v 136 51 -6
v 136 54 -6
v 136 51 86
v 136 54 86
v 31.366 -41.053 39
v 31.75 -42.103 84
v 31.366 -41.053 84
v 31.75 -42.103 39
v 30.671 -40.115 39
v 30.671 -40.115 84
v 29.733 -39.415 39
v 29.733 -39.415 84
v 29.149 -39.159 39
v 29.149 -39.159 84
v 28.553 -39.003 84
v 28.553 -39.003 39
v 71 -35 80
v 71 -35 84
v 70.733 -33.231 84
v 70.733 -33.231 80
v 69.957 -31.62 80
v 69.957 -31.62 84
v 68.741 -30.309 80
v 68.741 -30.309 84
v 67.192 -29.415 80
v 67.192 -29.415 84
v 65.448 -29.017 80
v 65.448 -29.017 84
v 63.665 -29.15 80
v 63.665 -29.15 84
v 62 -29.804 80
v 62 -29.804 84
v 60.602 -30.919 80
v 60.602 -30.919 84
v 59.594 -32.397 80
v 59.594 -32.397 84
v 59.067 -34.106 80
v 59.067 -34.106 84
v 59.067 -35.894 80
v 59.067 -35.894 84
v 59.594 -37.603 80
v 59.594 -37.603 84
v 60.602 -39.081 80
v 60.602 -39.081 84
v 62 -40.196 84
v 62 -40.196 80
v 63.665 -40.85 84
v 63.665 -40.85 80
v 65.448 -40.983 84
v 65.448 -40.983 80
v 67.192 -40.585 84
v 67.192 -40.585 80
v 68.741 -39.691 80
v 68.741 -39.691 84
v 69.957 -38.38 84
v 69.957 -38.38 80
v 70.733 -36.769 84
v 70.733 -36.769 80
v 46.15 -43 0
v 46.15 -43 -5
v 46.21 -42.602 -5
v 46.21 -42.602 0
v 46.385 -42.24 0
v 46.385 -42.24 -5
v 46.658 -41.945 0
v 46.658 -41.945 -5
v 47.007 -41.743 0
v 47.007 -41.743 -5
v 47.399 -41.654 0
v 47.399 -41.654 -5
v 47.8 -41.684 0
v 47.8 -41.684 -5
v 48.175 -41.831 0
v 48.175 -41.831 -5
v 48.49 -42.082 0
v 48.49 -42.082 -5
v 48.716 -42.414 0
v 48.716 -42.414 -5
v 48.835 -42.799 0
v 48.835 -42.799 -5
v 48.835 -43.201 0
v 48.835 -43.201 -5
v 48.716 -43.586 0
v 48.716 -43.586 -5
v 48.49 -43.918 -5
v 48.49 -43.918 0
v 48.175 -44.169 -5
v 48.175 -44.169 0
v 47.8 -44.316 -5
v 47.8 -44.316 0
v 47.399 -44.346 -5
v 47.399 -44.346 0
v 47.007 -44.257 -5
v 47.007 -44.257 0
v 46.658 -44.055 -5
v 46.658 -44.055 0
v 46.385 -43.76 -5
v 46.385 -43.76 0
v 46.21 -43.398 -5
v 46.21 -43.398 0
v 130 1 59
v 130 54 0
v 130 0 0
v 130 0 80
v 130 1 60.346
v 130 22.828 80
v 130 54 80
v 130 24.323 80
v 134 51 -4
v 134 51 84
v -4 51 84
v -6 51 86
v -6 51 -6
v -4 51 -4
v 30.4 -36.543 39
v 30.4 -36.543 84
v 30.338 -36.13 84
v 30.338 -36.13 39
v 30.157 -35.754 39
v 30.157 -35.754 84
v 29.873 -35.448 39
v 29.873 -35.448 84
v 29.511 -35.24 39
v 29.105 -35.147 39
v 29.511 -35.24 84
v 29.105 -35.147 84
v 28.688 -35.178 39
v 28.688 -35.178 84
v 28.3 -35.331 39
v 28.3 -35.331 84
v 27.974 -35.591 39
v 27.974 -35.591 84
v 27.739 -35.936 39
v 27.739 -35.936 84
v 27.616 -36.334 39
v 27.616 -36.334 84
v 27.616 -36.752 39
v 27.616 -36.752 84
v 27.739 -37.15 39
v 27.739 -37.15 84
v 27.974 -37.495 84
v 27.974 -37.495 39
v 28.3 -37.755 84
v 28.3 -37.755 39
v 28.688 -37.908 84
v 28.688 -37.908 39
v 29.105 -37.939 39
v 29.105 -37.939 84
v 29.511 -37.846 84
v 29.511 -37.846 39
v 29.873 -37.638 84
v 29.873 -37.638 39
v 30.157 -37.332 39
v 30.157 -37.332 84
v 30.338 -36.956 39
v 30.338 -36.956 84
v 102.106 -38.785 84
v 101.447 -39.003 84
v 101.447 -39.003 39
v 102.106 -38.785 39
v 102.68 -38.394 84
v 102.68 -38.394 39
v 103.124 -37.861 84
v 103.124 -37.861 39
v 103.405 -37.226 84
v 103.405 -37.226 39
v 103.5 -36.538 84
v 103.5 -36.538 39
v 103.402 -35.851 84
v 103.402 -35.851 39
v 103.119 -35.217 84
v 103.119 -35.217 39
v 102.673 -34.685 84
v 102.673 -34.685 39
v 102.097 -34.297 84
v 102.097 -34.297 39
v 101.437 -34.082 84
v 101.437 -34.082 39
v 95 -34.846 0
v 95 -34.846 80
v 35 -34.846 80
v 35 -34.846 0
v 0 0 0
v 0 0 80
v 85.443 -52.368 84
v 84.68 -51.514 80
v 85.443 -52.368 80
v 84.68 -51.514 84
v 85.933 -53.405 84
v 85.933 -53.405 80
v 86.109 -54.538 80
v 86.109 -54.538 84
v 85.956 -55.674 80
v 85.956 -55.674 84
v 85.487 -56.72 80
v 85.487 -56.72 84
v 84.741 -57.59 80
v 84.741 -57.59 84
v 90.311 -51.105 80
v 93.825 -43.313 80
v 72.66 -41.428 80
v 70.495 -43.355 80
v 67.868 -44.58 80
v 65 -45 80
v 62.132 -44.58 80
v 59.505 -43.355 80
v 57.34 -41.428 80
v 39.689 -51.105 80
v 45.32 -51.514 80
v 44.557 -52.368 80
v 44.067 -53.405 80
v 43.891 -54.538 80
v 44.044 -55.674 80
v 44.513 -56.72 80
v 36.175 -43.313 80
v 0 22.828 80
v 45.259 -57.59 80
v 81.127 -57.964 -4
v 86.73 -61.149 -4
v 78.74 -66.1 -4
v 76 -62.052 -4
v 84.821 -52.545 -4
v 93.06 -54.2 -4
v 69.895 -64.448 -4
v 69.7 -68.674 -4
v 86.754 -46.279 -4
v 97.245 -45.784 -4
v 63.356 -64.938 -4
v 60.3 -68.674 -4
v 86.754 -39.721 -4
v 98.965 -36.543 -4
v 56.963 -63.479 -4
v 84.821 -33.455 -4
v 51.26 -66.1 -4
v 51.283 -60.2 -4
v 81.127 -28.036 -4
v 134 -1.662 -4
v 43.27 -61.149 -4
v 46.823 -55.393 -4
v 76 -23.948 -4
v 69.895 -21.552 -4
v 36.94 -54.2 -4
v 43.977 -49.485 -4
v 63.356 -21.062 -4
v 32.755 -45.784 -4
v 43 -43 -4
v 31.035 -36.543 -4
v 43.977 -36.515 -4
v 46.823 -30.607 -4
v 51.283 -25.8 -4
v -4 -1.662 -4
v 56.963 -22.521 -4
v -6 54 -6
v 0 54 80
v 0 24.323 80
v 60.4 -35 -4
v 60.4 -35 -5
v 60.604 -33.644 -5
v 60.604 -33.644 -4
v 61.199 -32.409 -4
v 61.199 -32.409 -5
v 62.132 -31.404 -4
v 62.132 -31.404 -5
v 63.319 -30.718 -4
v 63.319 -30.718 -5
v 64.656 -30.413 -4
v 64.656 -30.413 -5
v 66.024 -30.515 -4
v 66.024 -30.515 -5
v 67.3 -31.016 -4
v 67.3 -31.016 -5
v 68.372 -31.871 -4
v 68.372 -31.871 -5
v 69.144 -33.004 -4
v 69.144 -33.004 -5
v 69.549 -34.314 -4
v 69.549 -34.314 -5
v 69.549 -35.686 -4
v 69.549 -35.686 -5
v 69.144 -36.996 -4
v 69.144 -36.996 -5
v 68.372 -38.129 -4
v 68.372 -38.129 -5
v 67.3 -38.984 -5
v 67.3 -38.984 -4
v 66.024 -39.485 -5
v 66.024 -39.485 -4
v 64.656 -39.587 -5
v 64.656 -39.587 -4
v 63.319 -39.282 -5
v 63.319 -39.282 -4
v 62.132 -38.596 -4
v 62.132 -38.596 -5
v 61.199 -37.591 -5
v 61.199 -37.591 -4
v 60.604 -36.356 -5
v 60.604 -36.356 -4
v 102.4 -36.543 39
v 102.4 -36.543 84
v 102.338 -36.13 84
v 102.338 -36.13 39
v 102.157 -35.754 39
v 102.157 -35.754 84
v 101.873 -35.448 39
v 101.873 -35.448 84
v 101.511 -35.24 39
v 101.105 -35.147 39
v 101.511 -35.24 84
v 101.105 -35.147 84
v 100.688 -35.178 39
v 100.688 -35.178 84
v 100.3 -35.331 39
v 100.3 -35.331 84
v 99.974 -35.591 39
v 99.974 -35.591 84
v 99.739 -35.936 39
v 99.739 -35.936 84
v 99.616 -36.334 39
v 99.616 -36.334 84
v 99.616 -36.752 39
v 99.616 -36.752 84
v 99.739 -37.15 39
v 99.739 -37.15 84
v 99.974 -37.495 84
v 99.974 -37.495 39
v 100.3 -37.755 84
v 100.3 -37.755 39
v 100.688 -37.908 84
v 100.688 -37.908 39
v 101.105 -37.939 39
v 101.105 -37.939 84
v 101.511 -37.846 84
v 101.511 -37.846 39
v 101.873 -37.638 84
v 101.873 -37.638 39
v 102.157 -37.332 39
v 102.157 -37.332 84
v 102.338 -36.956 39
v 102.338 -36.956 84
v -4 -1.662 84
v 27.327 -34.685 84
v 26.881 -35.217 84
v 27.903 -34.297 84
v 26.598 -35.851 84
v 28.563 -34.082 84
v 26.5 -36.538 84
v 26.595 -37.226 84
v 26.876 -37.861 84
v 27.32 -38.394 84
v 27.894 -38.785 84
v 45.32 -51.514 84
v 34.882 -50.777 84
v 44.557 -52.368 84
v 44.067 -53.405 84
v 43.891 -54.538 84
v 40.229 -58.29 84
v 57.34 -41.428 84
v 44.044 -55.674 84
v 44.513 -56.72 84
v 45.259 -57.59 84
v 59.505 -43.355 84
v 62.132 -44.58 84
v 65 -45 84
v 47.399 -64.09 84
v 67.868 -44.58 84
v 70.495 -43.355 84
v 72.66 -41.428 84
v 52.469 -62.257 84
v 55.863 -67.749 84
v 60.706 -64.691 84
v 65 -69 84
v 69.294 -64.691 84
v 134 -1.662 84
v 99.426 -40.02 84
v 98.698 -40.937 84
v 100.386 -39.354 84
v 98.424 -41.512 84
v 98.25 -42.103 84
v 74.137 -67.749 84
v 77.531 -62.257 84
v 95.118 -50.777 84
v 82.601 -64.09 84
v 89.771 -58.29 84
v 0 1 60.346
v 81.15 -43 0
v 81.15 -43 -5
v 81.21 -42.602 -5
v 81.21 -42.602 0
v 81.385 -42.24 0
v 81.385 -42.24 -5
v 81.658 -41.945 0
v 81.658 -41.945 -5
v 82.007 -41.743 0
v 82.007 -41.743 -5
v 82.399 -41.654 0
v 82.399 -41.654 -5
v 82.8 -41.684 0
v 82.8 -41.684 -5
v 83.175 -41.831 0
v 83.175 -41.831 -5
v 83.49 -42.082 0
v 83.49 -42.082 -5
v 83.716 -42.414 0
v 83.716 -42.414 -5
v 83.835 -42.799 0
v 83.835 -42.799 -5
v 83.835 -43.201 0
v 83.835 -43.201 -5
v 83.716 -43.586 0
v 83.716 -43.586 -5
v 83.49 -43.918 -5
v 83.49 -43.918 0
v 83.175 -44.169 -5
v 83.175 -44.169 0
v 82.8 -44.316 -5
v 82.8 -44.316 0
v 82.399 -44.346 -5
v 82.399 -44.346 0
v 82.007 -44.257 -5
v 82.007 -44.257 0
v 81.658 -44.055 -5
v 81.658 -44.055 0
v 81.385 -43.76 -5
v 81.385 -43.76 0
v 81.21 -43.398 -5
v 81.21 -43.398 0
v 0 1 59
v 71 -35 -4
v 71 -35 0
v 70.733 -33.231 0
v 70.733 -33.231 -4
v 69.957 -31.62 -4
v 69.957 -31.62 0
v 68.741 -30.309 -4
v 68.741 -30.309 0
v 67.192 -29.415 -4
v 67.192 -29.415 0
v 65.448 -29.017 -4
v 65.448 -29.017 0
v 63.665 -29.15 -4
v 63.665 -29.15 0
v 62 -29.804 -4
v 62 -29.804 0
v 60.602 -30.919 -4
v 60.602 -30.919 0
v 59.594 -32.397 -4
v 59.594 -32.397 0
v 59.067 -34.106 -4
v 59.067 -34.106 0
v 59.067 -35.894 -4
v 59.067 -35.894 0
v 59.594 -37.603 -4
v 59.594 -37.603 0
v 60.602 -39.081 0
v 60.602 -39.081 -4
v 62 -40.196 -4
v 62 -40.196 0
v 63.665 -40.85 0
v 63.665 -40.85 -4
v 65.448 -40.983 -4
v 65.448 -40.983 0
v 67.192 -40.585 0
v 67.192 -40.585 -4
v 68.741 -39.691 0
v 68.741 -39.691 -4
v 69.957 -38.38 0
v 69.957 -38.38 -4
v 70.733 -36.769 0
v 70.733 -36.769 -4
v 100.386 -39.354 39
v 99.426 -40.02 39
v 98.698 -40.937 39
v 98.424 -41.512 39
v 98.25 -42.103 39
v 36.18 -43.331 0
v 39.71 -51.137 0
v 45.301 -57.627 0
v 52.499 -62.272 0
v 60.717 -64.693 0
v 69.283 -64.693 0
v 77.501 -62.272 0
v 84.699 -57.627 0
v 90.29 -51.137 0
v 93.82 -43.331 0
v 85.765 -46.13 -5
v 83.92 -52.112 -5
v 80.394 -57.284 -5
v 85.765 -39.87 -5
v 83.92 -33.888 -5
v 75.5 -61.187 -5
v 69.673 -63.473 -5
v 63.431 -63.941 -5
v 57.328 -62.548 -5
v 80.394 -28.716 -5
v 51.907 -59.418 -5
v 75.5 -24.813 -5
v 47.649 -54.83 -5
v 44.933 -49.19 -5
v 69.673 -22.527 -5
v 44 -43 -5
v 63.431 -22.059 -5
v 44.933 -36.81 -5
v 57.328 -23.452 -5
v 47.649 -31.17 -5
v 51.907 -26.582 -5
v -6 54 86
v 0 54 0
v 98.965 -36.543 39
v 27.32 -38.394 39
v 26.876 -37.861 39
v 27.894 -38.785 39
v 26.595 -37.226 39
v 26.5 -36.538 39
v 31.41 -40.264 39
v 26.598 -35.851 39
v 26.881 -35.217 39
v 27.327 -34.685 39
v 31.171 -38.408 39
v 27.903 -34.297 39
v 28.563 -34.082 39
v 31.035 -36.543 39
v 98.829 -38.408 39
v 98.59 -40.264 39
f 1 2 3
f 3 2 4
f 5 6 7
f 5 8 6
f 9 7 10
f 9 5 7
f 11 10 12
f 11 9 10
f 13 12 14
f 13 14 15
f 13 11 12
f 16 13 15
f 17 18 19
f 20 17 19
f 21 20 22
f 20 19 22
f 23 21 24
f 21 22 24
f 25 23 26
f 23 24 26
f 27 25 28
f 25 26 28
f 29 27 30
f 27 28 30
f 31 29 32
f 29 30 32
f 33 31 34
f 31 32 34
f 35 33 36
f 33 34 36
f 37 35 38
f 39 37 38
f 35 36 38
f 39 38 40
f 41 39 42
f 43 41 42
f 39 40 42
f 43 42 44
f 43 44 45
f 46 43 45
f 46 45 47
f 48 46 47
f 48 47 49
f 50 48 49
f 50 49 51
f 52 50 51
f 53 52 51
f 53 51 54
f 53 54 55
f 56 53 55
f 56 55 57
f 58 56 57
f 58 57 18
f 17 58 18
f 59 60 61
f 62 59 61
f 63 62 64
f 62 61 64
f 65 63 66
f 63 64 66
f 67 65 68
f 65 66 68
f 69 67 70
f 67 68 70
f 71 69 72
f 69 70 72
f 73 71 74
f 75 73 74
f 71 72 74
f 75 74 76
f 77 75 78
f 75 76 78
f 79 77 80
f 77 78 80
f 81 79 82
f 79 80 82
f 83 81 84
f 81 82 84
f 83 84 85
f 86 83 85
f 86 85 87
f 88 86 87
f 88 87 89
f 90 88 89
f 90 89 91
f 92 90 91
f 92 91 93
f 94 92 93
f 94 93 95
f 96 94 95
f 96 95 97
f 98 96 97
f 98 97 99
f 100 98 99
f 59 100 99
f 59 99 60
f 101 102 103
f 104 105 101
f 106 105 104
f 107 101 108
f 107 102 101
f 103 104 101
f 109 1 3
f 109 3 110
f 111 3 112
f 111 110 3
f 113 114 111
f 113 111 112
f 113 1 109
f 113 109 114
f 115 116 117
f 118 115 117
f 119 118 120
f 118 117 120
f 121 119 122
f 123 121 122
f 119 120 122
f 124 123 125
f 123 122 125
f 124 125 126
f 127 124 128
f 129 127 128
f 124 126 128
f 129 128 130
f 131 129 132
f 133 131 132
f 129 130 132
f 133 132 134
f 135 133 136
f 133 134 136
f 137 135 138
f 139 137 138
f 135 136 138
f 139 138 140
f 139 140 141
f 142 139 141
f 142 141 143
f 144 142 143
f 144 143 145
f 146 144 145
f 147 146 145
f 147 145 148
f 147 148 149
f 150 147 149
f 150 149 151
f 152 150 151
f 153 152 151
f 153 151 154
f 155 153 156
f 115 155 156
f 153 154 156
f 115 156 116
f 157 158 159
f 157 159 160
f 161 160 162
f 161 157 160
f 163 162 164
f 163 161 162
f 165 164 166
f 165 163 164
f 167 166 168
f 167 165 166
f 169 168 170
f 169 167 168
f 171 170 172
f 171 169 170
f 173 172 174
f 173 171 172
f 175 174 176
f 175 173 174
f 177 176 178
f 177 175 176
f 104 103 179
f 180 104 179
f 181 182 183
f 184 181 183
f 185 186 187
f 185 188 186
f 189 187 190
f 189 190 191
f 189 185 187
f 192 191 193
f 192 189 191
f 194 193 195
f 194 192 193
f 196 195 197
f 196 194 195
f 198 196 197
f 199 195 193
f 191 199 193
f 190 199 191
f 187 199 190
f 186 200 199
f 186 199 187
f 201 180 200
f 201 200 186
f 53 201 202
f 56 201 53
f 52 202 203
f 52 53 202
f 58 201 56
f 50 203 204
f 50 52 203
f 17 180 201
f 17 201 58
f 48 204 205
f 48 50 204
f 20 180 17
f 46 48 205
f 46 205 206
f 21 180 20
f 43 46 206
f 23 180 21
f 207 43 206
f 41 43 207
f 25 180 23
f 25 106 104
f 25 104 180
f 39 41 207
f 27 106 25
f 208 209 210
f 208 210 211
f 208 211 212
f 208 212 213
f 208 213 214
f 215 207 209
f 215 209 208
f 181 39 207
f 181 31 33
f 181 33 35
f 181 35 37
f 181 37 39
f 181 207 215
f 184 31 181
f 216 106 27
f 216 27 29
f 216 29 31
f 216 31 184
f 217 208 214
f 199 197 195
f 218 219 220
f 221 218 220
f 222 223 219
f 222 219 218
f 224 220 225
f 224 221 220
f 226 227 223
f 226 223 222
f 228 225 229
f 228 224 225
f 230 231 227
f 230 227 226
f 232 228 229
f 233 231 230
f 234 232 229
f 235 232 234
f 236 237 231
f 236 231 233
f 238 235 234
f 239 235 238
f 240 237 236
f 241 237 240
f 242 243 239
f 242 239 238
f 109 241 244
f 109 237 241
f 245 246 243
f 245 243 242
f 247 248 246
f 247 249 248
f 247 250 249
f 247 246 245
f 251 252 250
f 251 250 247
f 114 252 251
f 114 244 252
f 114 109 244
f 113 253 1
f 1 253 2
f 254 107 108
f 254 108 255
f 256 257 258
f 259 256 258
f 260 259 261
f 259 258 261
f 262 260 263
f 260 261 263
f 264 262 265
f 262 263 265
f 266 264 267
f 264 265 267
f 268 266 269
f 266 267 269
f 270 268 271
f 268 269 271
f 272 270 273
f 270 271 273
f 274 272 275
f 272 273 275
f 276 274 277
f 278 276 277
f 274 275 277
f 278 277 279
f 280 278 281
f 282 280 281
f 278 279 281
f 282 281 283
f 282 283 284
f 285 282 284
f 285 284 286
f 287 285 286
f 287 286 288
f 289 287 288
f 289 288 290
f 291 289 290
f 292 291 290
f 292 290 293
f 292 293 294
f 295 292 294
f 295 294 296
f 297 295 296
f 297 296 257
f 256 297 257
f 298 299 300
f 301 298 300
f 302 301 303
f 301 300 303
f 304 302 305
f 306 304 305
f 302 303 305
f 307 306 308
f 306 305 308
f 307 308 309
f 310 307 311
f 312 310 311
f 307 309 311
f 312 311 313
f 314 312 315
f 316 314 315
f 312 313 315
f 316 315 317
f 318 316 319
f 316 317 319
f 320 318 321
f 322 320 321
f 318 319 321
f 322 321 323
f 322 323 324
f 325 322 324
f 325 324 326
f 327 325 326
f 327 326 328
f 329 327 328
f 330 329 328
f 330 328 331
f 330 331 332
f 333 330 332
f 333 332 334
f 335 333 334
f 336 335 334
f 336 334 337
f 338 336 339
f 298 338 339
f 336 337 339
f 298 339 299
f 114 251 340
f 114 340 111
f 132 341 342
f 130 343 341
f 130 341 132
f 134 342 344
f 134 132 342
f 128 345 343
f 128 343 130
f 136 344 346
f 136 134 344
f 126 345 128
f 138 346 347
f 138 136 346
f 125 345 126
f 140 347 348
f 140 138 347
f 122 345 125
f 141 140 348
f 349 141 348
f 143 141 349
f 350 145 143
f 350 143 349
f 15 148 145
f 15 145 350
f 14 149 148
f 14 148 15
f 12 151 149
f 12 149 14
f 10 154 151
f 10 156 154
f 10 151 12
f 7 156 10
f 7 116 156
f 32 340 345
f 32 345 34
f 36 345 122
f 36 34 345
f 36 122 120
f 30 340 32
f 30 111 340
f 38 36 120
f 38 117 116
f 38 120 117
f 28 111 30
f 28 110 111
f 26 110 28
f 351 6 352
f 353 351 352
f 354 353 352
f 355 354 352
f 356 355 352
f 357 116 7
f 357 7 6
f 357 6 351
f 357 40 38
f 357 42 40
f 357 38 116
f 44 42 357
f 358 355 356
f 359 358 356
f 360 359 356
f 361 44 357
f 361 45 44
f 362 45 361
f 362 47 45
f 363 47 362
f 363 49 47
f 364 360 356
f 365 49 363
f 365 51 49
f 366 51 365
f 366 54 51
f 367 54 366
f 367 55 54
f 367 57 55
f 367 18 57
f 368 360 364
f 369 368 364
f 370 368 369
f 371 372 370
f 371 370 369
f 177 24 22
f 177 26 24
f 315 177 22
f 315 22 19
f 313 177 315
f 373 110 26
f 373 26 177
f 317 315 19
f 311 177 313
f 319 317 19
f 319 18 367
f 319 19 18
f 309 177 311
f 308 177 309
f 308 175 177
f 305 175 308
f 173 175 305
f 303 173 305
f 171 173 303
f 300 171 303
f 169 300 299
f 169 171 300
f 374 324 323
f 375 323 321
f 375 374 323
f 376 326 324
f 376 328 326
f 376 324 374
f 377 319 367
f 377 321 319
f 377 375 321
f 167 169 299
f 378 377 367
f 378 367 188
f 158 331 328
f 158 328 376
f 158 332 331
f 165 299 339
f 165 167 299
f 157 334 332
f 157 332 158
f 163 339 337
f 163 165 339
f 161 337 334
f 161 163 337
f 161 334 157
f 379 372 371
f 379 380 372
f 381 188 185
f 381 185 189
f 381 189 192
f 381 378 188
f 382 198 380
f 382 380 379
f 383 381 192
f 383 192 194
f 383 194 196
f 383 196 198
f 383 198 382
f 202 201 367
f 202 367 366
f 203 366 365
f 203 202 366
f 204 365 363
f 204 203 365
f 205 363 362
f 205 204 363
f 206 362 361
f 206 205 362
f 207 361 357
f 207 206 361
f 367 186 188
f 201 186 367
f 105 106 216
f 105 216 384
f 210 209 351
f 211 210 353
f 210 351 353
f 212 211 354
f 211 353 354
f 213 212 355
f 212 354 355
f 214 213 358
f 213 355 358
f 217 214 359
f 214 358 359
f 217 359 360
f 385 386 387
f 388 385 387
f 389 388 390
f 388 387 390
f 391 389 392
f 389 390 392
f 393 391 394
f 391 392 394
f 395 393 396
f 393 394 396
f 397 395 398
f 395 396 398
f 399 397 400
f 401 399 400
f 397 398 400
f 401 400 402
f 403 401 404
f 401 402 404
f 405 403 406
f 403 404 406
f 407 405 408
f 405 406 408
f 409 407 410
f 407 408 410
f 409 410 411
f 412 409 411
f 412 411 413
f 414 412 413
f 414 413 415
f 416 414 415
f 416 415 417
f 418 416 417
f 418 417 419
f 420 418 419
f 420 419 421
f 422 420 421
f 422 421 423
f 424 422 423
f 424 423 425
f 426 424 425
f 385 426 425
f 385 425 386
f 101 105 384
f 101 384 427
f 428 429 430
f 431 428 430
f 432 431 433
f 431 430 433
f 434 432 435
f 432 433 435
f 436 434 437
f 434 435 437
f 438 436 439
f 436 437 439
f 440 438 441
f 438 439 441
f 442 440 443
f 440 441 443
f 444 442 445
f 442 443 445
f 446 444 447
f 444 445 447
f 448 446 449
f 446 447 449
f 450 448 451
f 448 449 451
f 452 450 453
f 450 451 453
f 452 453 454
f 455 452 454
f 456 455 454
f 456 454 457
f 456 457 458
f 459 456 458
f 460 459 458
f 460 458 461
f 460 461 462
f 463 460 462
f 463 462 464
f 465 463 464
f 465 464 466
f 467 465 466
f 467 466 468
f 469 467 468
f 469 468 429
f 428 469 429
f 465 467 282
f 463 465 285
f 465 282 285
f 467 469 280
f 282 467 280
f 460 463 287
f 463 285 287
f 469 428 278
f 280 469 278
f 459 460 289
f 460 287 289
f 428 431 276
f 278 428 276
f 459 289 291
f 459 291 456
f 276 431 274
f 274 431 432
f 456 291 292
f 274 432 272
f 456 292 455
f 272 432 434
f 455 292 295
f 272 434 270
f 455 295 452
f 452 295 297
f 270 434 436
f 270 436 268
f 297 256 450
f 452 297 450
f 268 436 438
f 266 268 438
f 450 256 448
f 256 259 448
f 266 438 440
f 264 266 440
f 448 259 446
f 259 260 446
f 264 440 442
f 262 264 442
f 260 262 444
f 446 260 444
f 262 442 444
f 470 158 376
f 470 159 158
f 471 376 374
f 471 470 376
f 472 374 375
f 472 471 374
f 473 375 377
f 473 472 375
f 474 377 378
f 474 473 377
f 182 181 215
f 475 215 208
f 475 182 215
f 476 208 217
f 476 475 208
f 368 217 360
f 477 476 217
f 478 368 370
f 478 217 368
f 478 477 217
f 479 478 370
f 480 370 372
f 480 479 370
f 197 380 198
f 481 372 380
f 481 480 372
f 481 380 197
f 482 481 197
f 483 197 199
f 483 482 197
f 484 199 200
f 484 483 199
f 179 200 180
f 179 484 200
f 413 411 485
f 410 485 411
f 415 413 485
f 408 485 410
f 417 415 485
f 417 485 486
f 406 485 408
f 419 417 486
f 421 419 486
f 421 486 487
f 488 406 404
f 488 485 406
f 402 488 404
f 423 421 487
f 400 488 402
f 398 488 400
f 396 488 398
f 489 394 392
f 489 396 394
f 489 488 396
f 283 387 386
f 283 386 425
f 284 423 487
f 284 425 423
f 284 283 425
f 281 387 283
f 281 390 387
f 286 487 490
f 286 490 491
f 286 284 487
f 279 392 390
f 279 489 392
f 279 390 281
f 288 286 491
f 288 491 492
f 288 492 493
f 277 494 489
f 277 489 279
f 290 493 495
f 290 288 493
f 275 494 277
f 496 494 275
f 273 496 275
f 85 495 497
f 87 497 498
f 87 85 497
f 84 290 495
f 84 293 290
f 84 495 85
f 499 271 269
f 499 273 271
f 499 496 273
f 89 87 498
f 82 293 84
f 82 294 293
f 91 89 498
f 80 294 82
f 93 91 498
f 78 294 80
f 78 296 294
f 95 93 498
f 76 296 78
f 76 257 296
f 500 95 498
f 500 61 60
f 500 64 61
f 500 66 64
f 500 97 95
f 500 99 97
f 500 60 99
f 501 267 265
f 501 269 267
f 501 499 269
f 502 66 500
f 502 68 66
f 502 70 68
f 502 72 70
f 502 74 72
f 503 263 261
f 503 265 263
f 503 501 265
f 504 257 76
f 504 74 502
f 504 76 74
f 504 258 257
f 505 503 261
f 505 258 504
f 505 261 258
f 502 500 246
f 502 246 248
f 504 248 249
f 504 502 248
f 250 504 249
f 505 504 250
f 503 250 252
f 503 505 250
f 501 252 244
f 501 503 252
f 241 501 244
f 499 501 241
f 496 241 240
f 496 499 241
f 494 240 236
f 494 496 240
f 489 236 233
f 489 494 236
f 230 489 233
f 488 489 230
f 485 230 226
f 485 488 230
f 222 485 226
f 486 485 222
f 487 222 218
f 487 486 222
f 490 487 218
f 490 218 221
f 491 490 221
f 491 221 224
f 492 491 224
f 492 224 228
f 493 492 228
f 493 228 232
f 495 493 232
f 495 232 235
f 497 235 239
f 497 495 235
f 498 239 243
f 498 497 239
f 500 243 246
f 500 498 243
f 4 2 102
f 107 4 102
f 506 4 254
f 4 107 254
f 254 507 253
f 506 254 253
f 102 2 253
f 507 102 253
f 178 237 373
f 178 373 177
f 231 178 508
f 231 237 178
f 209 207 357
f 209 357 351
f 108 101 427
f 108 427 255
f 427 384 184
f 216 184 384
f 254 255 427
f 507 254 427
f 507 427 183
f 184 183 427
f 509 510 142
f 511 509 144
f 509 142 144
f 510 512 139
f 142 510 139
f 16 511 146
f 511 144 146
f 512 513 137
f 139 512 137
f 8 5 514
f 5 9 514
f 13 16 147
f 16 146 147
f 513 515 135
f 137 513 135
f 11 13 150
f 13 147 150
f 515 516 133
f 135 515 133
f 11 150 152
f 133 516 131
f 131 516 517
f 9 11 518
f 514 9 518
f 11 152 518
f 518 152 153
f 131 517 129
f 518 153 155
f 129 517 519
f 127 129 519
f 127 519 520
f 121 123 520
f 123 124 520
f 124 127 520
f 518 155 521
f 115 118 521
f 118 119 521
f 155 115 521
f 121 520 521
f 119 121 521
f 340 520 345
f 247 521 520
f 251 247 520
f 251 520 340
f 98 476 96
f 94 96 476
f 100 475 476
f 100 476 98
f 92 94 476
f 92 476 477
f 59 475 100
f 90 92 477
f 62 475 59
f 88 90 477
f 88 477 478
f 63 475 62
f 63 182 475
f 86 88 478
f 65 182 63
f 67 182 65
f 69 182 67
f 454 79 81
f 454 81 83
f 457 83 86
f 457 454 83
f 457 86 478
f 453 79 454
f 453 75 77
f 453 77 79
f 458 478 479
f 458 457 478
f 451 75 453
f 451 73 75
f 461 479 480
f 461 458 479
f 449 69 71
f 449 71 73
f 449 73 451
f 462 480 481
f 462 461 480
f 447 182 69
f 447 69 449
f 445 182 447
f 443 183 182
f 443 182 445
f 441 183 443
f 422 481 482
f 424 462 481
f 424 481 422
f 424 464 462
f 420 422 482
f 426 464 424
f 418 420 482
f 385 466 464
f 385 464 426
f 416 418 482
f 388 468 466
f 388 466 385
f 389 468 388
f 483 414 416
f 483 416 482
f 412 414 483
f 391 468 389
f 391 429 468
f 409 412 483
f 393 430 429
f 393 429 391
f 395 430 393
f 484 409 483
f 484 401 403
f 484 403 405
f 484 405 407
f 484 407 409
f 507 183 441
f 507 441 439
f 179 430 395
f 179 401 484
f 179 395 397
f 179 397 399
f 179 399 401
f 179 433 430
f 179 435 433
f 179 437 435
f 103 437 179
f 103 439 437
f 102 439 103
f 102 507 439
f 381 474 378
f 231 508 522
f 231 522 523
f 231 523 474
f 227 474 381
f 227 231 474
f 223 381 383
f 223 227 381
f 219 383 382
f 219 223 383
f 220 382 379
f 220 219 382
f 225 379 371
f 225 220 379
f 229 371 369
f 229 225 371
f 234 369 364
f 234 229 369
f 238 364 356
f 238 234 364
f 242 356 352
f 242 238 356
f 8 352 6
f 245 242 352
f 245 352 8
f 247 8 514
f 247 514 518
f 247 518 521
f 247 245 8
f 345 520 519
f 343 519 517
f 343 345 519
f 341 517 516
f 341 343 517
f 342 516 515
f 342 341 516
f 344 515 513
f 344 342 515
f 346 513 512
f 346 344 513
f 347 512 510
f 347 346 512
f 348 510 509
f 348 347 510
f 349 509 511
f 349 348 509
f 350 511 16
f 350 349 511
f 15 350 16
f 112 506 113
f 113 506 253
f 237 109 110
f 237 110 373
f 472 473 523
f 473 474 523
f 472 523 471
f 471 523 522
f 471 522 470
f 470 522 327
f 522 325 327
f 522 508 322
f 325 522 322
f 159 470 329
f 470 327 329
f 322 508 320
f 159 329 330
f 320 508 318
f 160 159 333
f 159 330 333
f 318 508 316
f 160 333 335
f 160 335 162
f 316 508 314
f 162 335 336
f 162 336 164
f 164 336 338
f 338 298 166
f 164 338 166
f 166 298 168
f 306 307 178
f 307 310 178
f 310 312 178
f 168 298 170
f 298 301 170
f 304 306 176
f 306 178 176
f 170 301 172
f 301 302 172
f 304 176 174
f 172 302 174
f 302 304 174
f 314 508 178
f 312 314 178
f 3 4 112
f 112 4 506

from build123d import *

# Parameters (mm, degrees)
EXTRUDE_1_DEPTH             = 80
EXTRUDE_2_DEPTH             = 4
EXTRUDE_START               = 4
EXTRUDE_3_DEPTH             = 4
CUT_EXTRUDE_1_DEPTH         = 4
CUT_EXTRUDE_2_REACH         = 176.531
SKETCH_5_R                  = 6.0000000000000036
CUT_EXTRUDE_START           = -4
CUT_EXTRUDE_3_DEPTH         = 4
SKETCH_7_R                  = 21
EXTRUDE_4_DEPTH             = 1
CUT_EXTRUDE_5_REACH         = 177.037
SKETCH_9_R                  = 4.599999999999999
SKETCH_9_R_2                = 1.3500000000000065
EXTRUDE_5_REACH             = 130.756
EXTRUDE_5_DIRECTION_2_REACH = 130.756
SKETCH_12_W                 = 138
SKETCH_12_H                 = 88
EXTRUDE_6_DEPTH             = 3
CHAMFER_1_SIZE              = 1
SKETCH_13_R                 = 2.5000000000000027
SKETCH_13_R_2               = 1.3999999999999955
SKETCH_13_R_3               = 2.5000000000000244
SKETCH_13_R_4               = 1.4000000000000308
EXTRUDE_7_DEPTH             = 45
FILLET_1_R                  = 4
FILLET_2_R                  = 4


with BuildPart() as part:
    # 草圖1 → 填料-伸長1 (new body)
    with BuildSketch(Plane.XY):
        with BuildLine():
            Line((-4, -1.6620202496294076), (-4, 54.00000000000001))
            Line((-4, 54.00000000000001), (134, 54.00000000000001))
            Line((134, 54.00000000000001), (134, -1.662020249629414))
            Line((134, -1.662020249629414), (98.96497064934022, -36.54297400803102))
            ThreePointArc((98.96497064934022, -36.54297400803102), (65.00000000000001, -69), (31.035029350659826, -36.54297400803101))
            Line((31.035029350659826, -36.54297400803101), (-4, -1.6620202496294076))
        make_face()
        with BuildLine():
            Line((0, 0), (0, 50))
            Line((0, 50), (130, 50))
            Line((130, 50), (130, 0))
            Line((130, 0), (94.99960713766303, -34.8464695929839))
            ThreePointArc((94.99960713766303, -34.8464695929839), (65.00000000000001, -65), (35.000392862337, -34.84646959298392))
            Line((35.000392862337, -34.84646959298392), (0, 0))
        make_face(mode=Mode.SUBTRACT)
    extrude(amount=EXTRUDE_1_DEPTH)

    # 草圖2 → 填料-伸長2 (add)
    # profile 1 of 2: a face of its own
    with BuildSketch(Plane.XY.offset(80)):
        with BuildLine():
            Line((-4, 54.00000000000001), (-4, -1.6620202496294076))
            Line((-4, -1.6620202496294076), (31.03502935065982, -36.54297400803101))
            ThreePointArc((31.03502935065982, -36.54297400803101), (65.00000000000001, -69), (98.96497064934022, -36.54297400803102))
            Line((98.96497064934022, -36.54297400803102), (134, -1.662020249629414))
            Line((134, -1.662020249629414), (134, 54.00000000000001))
            Line((134, 54.00000000000001), (-4, 54.00000000000001))
        make_face()
        with BuildLine():
            Line((130, 0), (94.99960713766303, -34.8464695929839))
            ThreePointArc((94.99960713766303, -34.8464695929839), (65.00000000000003, -65), (35.000392862337, -34.84646959298392))
            Line((35.000392862337, -34.84646959298392), (0, 0))
            Line((0, 0), (0, 50))
            Line((0, 50), (130, 50))
            Line((130, 50), (130, 0))
        make_face(mode=Mode.SUBTRACT)
    # profile 2 of 2: a face of its own
    with BuildSketch(Plane.XY.offset(80)):
        with BuildLine():
            ThreePointArc((94.99960713766303, -34.8464695929839), (65.00000000000003, -65), (35.000392862337, -34.84646959298392))
            Line((35.000392862337, -34.84646959298392), (0, 0))
            Line((0, 0), (0, 50))
            Line((0, 50), (130, 50))
            Line((130, 50), (130, 0))
            Line((130, 0), (94.99960713766303, -34.8464695929839))
        make_face()
    extrude(amount=EXTRUDE_2_DEPTH)

    # 草圖3 → 填料-伸長3 (add)
    with BuildSketch(Plane(origin=(0, 0, 0), x_dir=(-1, 0, 0), z_dir=(0, 0, -1)).offset(EXTRUDE_START)):
        with BuildLine():
            Line((-134, 54.00000000000001), (-134, -1.662020249629414))
            Line((-134, -1.662020249629414), (-98.9649706493402, -36.54297400803101))
            ThreePointArc((-98.9649706493402, -36.54297400803101), (-65.00000000000001, -69), (-31.03502935065982, -36.54297400803101))
            Line((-31.03502935065982, -36.54297400803101), (4, -1.6620202496294076))
            Line((4, -1.6620202496294076), (4, 54.00000000000001))
            Line((4, 54.00000000000001), (-134, 54.00000000000001))
        make_face()
    extrude(amount=-EXTRUDE_3_DEPTH)

    # 草圖4 → 除料-伸長1 (cut)
    with BuildSketch(Plane(origin=(0, 54.00000000000001, 0), x_dir=(1, 0, 0), z_dir=(0, 1, 0))):
        Polygon((0, 1.73e-15), (130, 0), (130, -80), (1.029e-14, -80), align=None)
    extrude(amount=-CUT_EXTRUDE_1_DEPTH, mode=Mode.SUBTRACT)

    # 除料-伸長2: up to this face of the body (flat: up to its plane)
    cut_extrude_2_end = Plane(part.part.faces().sort_by_distance((65, 4.120950098, -4))[0])
    # 草圖5 → 除料-伸長2 (cut, up to the picked face)
    with BuildSketch(Plane.XY.offset(84), mode=Mode.PRIVATE) as cut_extrude_2_sk1:
        with Locations((65.00000000000001, -35)):
            Circle(SKETCH_5_R)
    cut_extrude_2_tool1 = split(extrude(cut_extrude_2_sk1.sketch, amount=-CUT_EXTRUDE_2_REACH, mode=Mode.PRIVATE), bisect_by=cut_extrude_2_end, keep=Keep.BOTH, mode=Mode.PRIVATE)
    add(cut_extrude_2_tool1.solids().sort_by(Axis((65, -35, 84), (0, 0, -1)))[0], mode=Mode.SUBTRACT)

    # 草圖6 → 除料-伸長3 (cut)
    with BuildSketch(Plane.XY.offset(84).offset(CUT_EXTRUDE_START)):
        with BuildLine():
            ThreePointArc((64.99999999999967, -45), (60.77381738259285, -44.06307787036642), (57.33955556881022, -41.427876096865376))
            Line((57.339555568810226, -41.42787609686538), (42.01866670643064, -54.28362829059615))
            ThreePointArc((42.01866670643065, -54.28362829059614), (52.32145214777887, -62.18923361109942), (64.99999999999969, -65))
            Line((65.00000000000004, -65), (65.00000000000003, -45.00000000000001))
        make_face()
        with BuildLine():
            Line((87.9813332935694, -54.28362829059614), (72.66044443118982, -41.427876096865376))
            ThreePointArc((72.66044443118982, -41.427876096865376), (69.22618261740686, -44.06307787036657), (64.99999999999967, -45))
            Line((65.00000000000003, -45.00000000000001), (65.00000000000004, -65))
            ThreePointArc((64.99999999999969, -65), (77.67854785222087, -62.18923361109955), (87.9813332935694, -54.28362829059614))
        make_face()
    extrude(amount=CUT_EXTRUDE_3_DEPTH, mode=Mode.SUBTRACT)

    # 草圖7 → 填料-伸長4 (add)
    with BuildSketch(Plane(origin=(0, 0, -4), x_dir=(-1, 0, 0), z_dir=(0, 0, -1))):
        with Locations((-65.00000000000001, -43)):
            Circle(SKETCH_7_R)
    extrude(amount=EXTRUDE_4_DEPTH)

    # 草圖9 → 除料-伸長5 (cut, up to next)
    with BuildSketch(Plane(origin=(0, 0, -5), x_dir=(-1, 0, 0), z_dir=(0, 0, -1)), mode=Mode.PRIVATE) as cut_extrude_5_sk1:
        with Locations((-65.00000000000001, -35)):
            Circle(SKETCH_9_R)
    cut_extrude_5_tool1 = extrude(cut_extrude_5_sk1.sketch, amount=-CUT_EXTRUDE_5_REACH, mode=Mode.PRIVATE) & part.part
    # 草圖9 → 除料-伸長5 (cut, up to next)
    with BuildSketch(Plane(origin=(0, 0, -5), x_dir=(-1, 0, 0), z_dir=(0, 0, -1)), mode=Mode.PRIVATE) as cut_extrude_5_sk2:
        with Locations((-82.50000000000001, -43)):
            Circle(SKETCH_9_R_2)
    cut_extrude_5_tool2 = extrude(cut_extrude_5_sk2.sketch, amount=-CUT_EXTRUDE_5_REACH, mode=Mode.PRIVATE) & part.part
    # 草圖9 → 除料-伸長5 (cut, up to next)
    with BuildSketch(Plane(origin=(0, 0, -5), x_dir=(-1, 0, 0), z_dir=(0, 0, -1)), mode=Mode.PRIVATE) as cut_extrude_5_sk3:
        with Locations((-47.50000000000001, -43)):
            Circle(SKETCH_9_R_2)
    cut_extrude_5_tool3 = extrude(cut_extrude_5_sk3.sketch, amount=-CUT_EXTRUDE_5_REACH, mode=Mode.PRIVATE) & part.part
    add(cut_extrude_5_tool1.solids().sort_by_distance((65, -35, -5))[0], mode=Mode.SUBTRACT)
    add(cut_extrude_5_tool2.solids().sort_by_distance((82.5, -43, -5))[0], mode=Mode.SUBTRACT)
    add(cut_extrude_5_tool3.solids().sort_by_distance((47.5, -43, -5))[0], mode=Mode.SUBTRACT)

    # 填料-伸長5: up to this face of the body (flat: up to its plane)
    extrude_5_end = Plane(part.part.faces().sort_by_distance((130, 27, 40))[0])
    # 草圖10 → 填料-伸長5 (add, up to the picked face)
    with BuildSketch(Plane(origin=(65, 0, 0), x_dir=(0, 0, -1), z_dir=(1, 0, 0)), mode=Mode.PRIVATE) as extrude_5_sk1:
        Polygon((-83, 26.160223806036317), (-60.34563272960637, 1.0000000000000073), (-59.00000000000001, 1.0000000000000078), (-84, 28.765312870730142), (-84, 1.0000000000000044), (-83, 1.0000000000000044), align=None)
    extrude_5_tool1 = split(extrude(extrude_5_sk1.sketch, amount=EXTRUDE_5_REACH, mode=Mode.PRIVATE), bisect_by=extrude_5_end, keep=Keep.BOTH, mode=Mode.PRIVATE)
    add(extrude_5_tool1.solids().sort_by(Axis((65, 13.830112, 71.395163), (1, 0, 0)))[0])

    # 填料-伸長5 direction 2: up to this face of the body (flat: up to its plane)
    extrude_5_direction_2_end = Plane(part.part.faces().sort_by_distance((0, 27, 40))[0])
    # 草圖10 → 填料-伸長5 direction 2 (add, up to the picked face)
    with BuildSketch(Plane(origin=(65, 0, 0), x_dir=(0, 0, -1), z_dir=(1, 0, 0)), mode=Mode.PRIVATE) as extrude_5_direction_2_sk1:
        Polygon((-83, 26.160223806036317), (-60.34563272960637, 1.0000000000000073), (-59.00000000000001, 1.0000000000000078), (-84, 28.765312870730142), (-84, 1.0000000000000044), (-83, 1.0000000000000044), align=None)
    extrude_5_direction_2_tool1 = split(extrude(extrude_5_direction_2_sk1.sketch, amount=-EXTRUDE_5_DIRECTION_2_REACH, mode=Mode.PRIVATE), bisect_by=extrude_5_direction_2_end, keep=Keep.BOTH, mode=Mode.PRIVATE)
    add(extrude_5_direction_2_tool1.solids().sort_by(Axis((65, 13.830112, 71.395163), (-1, 0, 0)))[0])

    # 草圖12 → 填料-伸長6 (add)
    with BuildSketch(Plane(origin=(0, 54.00000000000001, 0), x_dir=(1, 0, 0), z_dir=(0, 1, 0))):
        Polygon((-6, 6), (136, 6), (136, -86), (-5.9999999999999885, -86), align=None)
        with Locations((65, -40)):
            Rectangle(SKETCH_12_W, SKETCH_12_H, mode=Mode.SUBTRACT)
    extrude(amount=-EXTRUDE_6_DEPTH)

    # 導角1
    chamfer_1_edges = [part.edges().sort_by_distance(p)[0] for p in [
        (86.00000000000001, -43, -4),
    ]]
    chamfer(chamfer_1_edges, length=CHAMFER_1_SIZE - 0.0001)  # a hair under: the kernel refuses the full size

    # 草圖13 → 填料-伸長7 (add)
    # profile 1 of 2: a face of its own
    with BuildSketch(Plane.XY.offset(84)):
        with Locations((29.000000000000018, -36.54297400803102)):
            Circle(SKETCH_13_R)
        with Locations((29.000000000000018, -36.54297400803102)):
            Circle(SKETCH_13_R_2, mode=Mode.SUBTRACT)
    # profile 2 of 2: a face of its own
    with BuildSketch(Plane.XY.offset(84)):
        with Locations((101, -36.54297400803102)):
            Circle(SKETCH_13_R_3)
        with Locations((101, -36.54297400803102)):
            Circle(SKETCH_13_R_4, mode=Mode.SUBTRACT)
    extrude(amount=-EXTRUDE_7_DEPTH)

    # 圓角1
    fillet_1_edges = [part.edges().sort_by_distance(p)[0] for p in [
        (42.01866670643065, -54.28362829059614, 82),
        (87.9813332935694, -54.28362829059614, 82),
    ]]
    fillet(fillet_1_edges, radius=FILLET_1_R)

    # 圓角2
    fillet_2_edges = [part.edges().sort_by_distance(p)[0] for p in [
        (31.121034817860412, -37.86630741327102, 61.5),
        (98.87896518213962, -37.86630741327102, 61.5),
    ]]
    fillet(fillet_2_edges, radius=FILLET_2_R)


solid = part.part
